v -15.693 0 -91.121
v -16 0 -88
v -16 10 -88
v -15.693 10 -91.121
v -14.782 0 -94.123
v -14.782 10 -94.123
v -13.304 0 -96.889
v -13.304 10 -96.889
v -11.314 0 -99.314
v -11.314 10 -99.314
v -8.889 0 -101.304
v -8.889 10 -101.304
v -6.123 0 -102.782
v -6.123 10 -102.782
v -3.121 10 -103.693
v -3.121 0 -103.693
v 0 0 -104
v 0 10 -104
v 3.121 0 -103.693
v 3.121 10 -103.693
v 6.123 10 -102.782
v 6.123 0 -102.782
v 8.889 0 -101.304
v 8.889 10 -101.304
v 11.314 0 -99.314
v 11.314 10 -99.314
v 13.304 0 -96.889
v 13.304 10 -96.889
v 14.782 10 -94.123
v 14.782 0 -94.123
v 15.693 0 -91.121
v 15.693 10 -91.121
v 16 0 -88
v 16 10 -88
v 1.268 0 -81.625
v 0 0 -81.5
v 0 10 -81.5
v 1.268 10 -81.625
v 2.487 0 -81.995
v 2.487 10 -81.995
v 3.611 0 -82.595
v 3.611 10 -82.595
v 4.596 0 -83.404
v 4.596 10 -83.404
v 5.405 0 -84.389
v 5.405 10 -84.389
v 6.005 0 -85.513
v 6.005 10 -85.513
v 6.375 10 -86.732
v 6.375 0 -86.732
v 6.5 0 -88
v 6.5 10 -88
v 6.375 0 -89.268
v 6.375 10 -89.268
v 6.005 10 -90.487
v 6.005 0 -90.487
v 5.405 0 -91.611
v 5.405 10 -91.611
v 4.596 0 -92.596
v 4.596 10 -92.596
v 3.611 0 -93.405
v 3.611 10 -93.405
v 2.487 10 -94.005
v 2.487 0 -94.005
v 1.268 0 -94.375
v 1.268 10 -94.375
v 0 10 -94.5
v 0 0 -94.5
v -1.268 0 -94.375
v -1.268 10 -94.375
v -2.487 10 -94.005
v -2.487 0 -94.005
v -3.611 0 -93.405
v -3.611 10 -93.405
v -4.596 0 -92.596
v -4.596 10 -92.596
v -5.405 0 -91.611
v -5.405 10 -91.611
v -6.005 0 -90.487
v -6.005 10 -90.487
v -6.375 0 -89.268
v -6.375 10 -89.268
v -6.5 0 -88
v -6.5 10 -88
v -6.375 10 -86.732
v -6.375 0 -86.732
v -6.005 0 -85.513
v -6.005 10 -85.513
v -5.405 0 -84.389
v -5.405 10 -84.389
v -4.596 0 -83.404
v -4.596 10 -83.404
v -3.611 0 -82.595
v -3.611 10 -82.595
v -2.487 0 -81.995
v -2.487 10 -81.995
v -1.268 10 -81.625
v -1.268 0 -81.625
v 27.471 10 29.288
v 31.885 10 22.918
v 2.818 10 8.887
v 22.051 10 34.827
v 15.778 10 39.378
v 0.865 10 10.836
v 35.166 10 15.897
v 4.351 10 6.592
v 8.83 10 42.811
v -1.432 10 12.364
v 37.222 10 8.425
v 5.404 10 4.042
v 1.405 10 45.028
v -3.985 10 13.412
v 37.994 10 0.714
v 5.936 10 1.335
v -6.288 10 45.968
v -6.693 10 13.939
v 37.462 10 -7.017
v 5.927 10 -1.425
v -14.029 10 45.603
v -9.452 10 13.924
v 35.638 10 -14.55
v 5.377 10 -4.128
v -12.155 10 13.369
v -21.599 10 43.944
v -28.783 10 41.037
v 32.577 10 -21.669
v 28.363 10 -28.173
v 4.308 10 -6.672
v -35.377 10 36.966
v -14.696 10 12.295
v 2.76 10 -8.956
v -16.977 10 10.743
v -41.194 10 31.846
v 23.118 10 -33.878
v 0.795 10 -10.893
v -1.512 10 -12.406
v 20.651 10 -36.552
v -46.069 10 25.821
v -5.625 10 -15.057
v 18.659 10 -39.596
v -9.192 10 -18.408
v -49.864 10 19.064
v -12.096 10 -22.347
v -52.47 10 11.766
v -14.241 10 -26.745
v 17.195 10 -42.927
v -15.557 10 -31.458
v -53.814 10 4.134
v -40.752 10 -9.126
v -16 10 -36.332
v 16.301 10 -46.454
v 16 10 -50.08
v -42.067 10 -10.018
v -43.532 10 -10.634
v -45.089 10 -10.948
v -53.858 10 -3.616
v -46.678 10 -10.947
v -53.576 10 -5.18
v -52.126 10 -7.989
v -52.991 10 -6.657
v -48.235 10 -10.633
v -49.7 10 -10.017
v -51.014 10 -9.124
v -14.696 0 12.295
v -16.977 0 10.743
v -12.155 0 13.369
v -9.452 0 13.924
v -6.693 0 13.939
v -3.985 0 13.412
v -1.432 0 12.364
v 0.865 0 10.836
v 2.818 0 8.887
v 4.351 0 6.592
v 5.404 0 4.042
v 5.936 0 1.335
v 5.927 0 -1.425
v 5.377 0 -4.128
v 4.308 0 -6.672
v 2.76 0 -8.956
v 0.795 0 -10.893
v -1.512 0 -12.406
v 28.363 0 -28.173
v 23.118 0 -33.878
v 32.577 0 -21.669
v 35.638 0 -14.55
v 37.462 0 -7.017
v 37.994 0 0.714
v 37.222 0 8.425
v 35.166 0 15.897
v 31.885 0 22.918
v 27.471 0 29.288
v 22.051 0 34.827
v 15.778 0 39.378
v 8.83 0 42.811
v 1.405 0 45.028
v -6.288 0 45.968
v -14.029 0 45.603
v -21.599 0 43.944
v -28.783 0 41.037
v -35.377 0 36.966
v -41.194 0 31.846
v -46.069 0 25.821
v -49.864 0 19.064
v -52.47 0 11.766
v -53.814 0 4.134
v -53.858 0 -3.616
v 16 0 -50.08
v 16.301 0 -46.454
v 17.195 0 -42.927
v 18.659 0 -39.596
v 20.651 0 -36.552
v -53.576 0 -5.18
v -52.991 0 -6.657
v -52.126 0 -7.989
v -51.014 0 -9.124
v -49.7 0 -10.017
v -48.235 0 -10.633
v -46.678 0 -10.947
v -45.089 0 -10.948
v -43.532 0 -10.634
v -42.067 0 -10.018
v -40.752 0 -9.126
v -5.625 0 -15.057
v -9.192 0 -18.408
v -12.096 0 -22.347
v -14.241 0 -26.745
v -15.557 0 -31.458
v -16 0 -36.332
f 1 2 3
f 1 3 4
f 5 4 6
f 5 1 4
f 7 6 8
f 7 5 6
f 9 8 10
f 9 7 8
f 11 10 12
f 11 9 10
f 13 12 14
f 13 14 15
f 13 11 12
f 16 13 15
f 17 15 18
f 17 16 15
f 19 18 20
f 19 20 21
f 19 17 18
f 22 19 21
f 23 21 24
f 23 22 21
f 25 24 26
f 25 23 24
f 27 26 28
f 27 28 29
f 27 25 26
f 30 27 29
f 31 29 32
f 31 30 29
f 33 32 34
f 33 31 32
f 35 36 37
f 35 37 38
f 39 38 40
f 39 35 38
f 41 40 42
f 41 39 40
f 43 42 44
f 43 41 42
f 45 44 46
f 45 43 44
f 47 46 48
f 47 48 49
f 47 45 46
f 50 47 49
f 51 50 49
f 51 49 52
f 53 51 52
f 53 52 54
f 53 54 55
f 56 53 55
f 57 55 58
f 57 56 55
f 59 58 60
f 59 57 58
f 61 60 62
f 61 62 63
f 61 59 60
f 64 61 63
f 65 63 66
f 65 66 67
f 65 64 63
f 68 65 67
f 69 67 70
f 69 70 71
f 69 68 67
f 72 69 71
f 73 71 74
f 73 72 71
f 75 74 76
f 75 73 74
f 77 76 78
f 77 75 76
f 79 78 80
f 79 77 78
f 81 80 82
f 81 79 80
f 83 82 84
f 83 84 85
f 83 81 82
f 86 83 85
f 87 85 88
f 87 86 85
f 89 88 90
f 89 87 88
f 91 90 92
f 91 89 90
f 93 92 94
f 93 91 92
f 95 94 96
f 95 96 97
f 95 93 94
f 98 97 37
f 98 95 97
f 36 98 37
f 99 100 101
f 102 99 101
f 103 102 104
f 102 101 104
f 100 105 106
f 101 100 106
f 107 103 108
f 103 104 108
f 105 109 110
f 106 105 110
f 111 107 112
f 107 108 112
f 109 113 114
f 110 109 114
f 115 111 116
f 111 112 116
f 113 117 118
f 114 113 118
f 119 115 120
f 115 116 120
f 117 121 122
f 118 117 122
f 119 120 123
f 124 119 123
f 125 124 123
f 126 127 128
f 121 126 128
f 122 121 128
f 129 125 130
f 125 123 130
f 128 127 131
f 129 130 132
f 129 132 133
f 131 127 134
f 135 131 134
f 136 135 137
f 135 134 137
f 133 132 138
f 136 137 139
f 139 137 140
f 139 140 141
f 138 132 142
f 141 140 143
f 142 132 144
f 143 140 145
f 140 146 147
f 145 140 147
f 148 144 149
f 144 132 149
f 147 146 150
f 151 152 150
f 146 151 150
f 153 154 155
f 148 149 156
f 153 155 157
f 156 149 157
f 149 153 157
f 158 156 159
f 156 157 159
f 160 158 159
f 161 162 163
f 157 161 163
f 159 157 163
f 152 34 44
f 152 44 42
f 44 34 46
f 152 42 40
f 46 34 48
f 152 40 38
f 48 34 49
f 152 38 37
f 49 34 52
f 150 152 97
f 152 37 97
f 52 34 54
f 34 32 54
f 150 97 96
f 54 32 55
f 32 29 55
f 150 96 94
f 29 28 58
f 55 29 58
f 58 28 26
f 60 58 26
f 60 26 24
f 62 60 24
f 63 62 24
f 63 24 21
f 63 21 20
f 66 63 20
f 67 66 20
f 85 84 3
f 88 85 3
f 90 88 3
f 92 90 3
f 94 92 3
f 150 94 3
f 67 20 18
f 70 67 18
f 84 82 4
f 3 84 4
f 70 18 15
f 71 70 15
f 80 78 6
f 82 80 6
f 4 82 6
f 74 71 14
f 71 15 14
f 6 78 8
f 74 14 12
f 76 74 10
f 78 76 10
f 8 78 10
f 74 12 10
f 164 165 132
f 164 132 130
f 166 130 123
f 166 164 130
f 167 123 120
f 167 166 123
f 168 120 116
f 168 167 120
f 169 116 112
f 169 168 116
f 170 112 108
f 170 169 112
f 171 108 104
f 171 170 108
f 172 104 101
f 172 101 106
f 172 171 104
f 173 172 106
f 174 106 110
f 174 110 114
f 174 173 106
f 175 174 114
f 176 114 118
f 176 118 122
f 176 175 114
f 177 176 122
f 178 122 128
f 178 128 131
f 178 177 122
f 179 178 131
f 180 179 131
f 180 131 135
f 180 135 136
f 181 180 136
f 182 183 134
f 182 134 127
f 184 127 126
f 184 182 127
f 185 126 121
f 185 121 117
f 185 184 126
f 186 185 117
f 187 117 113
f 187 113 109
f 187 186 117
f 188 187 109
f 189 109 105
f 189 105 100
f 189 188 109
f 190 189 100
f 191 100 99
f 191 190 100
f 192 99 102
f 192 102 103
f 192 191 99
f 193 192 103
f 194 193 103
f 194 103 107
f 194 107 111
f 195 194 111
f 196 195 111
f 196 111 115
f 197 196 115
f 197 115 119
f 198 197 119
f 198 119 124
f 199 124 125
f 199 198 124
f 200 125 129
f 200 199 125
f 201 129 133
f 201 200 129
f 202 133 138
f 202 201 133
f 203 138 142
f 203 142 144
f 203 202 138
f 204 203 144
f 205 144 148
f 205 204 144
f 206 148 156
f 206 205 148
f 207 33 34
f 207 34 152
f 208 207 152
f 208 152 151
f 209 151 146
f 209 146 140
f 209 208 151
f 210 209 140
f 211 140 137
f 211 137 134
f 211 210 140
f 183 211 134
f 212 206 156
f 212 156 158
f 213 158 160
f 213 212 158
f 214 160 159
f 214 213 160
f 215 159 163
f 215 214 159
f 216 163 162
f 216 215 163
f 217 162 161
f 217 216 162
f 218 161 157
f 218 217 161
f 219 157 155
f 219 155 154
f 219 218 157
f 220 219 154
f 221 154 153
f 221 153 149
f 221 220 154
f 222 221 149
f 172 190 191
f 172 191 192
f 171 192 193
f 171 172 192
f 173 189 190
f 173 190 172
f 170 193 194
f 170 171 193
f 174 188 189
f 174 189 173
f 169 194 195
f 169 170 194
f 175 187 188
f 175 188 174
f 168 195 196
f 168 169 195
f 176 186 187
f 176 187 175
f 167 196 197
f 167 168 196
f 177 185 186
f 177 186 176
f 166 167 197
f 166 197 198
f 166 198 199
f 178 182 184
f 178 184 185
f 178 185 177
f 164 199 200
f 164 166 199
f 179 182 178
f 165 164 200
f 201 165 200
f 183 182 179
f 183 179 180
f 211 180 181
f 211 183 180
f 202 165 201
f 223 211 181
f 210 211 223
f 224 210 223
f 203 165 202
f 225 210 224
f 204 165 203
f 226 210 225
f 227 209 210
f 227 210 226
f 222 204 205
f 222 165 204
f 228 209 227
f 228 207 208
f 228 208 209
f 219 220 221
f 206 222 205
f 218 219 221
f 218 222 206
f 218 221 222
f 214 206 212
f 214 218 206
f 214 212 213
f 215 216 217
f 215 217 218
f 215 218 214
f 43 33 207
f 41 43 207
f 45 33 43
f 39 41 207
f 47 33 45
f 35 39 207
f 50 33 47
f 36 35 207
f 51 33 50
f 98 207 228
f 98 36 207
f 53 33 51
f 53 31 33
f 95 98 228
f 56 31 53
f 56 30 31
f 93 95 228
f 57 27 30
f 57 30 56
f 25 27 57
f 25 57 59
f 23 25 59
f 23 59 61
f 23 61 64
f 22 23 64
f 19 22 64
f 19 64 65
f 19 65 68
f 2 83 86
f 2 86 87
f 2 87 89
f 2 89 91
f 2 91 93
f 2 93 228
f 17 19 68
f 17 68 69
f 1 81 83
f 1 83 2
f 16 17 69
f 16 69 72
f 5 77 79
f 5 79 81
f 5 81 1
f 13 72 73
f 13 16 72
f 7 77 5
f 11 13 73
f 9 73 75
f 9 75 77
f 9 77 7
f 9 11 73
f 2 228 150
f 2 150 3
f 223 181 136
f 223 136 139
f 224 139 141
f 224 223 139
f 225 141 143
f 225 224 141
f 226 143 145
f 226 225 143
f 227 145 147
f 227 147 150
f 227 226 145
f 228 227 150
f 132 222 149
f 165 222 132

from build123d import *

# Parameters (mm, degrees)
SKETCH1_R           = 6.5
BOSS_EXTRUDE1_DEPTH = 10


with BuildPart() as part:
    # Sketch1 → Boss-Extrude1 (new body)
    with BuildSketch(Plane(origin=(0, 0, 0), x_dir=(1, 0, 0), z_dir=(0, 1, 0))):
        with BuildLine():
            Line((16, 88), (16, 50.079936102))
            ThreePointArc((16, 50.079936102), (17.85785805, 41.23153977), (23.117647059, 33.877603834))
            ThreePointArc((23.117647059, 33.877603834), (8.830347529, -42.810505744), (-53.85766764, 3.615842732))
            ThreePointArc((-53.85766764, 3.615842732), (-48.982974202, 10.361725626), (-40.752437215, 9.125670194))
            Line((-40.752437215, 9.125670194), (-16.977471788, -10.742671935))
            ThreePointArc((-16.977471788, -10.742671935), (3.641076169, -7.777232518), (-1.512195122, 12.405981939))
            ThreePointArc((-1.512195122, 12.405981939), (-12.095770915, 22.346620452), (-16, 36.331804249))
            Line((-16, 36.331804249), (-16, 88))
            ThreePointArc((-16, 88), (0, 104), (16, 88))
        make_face()
        with Locations(Location((0, 88, 0), (0, 0, 270))):
            Circle(SKETCH1_R, mode=Mode.SUBTRACT)
    extrude(amount=BOSS_EXTRUDE1_DEPTH)


solid = part.part
